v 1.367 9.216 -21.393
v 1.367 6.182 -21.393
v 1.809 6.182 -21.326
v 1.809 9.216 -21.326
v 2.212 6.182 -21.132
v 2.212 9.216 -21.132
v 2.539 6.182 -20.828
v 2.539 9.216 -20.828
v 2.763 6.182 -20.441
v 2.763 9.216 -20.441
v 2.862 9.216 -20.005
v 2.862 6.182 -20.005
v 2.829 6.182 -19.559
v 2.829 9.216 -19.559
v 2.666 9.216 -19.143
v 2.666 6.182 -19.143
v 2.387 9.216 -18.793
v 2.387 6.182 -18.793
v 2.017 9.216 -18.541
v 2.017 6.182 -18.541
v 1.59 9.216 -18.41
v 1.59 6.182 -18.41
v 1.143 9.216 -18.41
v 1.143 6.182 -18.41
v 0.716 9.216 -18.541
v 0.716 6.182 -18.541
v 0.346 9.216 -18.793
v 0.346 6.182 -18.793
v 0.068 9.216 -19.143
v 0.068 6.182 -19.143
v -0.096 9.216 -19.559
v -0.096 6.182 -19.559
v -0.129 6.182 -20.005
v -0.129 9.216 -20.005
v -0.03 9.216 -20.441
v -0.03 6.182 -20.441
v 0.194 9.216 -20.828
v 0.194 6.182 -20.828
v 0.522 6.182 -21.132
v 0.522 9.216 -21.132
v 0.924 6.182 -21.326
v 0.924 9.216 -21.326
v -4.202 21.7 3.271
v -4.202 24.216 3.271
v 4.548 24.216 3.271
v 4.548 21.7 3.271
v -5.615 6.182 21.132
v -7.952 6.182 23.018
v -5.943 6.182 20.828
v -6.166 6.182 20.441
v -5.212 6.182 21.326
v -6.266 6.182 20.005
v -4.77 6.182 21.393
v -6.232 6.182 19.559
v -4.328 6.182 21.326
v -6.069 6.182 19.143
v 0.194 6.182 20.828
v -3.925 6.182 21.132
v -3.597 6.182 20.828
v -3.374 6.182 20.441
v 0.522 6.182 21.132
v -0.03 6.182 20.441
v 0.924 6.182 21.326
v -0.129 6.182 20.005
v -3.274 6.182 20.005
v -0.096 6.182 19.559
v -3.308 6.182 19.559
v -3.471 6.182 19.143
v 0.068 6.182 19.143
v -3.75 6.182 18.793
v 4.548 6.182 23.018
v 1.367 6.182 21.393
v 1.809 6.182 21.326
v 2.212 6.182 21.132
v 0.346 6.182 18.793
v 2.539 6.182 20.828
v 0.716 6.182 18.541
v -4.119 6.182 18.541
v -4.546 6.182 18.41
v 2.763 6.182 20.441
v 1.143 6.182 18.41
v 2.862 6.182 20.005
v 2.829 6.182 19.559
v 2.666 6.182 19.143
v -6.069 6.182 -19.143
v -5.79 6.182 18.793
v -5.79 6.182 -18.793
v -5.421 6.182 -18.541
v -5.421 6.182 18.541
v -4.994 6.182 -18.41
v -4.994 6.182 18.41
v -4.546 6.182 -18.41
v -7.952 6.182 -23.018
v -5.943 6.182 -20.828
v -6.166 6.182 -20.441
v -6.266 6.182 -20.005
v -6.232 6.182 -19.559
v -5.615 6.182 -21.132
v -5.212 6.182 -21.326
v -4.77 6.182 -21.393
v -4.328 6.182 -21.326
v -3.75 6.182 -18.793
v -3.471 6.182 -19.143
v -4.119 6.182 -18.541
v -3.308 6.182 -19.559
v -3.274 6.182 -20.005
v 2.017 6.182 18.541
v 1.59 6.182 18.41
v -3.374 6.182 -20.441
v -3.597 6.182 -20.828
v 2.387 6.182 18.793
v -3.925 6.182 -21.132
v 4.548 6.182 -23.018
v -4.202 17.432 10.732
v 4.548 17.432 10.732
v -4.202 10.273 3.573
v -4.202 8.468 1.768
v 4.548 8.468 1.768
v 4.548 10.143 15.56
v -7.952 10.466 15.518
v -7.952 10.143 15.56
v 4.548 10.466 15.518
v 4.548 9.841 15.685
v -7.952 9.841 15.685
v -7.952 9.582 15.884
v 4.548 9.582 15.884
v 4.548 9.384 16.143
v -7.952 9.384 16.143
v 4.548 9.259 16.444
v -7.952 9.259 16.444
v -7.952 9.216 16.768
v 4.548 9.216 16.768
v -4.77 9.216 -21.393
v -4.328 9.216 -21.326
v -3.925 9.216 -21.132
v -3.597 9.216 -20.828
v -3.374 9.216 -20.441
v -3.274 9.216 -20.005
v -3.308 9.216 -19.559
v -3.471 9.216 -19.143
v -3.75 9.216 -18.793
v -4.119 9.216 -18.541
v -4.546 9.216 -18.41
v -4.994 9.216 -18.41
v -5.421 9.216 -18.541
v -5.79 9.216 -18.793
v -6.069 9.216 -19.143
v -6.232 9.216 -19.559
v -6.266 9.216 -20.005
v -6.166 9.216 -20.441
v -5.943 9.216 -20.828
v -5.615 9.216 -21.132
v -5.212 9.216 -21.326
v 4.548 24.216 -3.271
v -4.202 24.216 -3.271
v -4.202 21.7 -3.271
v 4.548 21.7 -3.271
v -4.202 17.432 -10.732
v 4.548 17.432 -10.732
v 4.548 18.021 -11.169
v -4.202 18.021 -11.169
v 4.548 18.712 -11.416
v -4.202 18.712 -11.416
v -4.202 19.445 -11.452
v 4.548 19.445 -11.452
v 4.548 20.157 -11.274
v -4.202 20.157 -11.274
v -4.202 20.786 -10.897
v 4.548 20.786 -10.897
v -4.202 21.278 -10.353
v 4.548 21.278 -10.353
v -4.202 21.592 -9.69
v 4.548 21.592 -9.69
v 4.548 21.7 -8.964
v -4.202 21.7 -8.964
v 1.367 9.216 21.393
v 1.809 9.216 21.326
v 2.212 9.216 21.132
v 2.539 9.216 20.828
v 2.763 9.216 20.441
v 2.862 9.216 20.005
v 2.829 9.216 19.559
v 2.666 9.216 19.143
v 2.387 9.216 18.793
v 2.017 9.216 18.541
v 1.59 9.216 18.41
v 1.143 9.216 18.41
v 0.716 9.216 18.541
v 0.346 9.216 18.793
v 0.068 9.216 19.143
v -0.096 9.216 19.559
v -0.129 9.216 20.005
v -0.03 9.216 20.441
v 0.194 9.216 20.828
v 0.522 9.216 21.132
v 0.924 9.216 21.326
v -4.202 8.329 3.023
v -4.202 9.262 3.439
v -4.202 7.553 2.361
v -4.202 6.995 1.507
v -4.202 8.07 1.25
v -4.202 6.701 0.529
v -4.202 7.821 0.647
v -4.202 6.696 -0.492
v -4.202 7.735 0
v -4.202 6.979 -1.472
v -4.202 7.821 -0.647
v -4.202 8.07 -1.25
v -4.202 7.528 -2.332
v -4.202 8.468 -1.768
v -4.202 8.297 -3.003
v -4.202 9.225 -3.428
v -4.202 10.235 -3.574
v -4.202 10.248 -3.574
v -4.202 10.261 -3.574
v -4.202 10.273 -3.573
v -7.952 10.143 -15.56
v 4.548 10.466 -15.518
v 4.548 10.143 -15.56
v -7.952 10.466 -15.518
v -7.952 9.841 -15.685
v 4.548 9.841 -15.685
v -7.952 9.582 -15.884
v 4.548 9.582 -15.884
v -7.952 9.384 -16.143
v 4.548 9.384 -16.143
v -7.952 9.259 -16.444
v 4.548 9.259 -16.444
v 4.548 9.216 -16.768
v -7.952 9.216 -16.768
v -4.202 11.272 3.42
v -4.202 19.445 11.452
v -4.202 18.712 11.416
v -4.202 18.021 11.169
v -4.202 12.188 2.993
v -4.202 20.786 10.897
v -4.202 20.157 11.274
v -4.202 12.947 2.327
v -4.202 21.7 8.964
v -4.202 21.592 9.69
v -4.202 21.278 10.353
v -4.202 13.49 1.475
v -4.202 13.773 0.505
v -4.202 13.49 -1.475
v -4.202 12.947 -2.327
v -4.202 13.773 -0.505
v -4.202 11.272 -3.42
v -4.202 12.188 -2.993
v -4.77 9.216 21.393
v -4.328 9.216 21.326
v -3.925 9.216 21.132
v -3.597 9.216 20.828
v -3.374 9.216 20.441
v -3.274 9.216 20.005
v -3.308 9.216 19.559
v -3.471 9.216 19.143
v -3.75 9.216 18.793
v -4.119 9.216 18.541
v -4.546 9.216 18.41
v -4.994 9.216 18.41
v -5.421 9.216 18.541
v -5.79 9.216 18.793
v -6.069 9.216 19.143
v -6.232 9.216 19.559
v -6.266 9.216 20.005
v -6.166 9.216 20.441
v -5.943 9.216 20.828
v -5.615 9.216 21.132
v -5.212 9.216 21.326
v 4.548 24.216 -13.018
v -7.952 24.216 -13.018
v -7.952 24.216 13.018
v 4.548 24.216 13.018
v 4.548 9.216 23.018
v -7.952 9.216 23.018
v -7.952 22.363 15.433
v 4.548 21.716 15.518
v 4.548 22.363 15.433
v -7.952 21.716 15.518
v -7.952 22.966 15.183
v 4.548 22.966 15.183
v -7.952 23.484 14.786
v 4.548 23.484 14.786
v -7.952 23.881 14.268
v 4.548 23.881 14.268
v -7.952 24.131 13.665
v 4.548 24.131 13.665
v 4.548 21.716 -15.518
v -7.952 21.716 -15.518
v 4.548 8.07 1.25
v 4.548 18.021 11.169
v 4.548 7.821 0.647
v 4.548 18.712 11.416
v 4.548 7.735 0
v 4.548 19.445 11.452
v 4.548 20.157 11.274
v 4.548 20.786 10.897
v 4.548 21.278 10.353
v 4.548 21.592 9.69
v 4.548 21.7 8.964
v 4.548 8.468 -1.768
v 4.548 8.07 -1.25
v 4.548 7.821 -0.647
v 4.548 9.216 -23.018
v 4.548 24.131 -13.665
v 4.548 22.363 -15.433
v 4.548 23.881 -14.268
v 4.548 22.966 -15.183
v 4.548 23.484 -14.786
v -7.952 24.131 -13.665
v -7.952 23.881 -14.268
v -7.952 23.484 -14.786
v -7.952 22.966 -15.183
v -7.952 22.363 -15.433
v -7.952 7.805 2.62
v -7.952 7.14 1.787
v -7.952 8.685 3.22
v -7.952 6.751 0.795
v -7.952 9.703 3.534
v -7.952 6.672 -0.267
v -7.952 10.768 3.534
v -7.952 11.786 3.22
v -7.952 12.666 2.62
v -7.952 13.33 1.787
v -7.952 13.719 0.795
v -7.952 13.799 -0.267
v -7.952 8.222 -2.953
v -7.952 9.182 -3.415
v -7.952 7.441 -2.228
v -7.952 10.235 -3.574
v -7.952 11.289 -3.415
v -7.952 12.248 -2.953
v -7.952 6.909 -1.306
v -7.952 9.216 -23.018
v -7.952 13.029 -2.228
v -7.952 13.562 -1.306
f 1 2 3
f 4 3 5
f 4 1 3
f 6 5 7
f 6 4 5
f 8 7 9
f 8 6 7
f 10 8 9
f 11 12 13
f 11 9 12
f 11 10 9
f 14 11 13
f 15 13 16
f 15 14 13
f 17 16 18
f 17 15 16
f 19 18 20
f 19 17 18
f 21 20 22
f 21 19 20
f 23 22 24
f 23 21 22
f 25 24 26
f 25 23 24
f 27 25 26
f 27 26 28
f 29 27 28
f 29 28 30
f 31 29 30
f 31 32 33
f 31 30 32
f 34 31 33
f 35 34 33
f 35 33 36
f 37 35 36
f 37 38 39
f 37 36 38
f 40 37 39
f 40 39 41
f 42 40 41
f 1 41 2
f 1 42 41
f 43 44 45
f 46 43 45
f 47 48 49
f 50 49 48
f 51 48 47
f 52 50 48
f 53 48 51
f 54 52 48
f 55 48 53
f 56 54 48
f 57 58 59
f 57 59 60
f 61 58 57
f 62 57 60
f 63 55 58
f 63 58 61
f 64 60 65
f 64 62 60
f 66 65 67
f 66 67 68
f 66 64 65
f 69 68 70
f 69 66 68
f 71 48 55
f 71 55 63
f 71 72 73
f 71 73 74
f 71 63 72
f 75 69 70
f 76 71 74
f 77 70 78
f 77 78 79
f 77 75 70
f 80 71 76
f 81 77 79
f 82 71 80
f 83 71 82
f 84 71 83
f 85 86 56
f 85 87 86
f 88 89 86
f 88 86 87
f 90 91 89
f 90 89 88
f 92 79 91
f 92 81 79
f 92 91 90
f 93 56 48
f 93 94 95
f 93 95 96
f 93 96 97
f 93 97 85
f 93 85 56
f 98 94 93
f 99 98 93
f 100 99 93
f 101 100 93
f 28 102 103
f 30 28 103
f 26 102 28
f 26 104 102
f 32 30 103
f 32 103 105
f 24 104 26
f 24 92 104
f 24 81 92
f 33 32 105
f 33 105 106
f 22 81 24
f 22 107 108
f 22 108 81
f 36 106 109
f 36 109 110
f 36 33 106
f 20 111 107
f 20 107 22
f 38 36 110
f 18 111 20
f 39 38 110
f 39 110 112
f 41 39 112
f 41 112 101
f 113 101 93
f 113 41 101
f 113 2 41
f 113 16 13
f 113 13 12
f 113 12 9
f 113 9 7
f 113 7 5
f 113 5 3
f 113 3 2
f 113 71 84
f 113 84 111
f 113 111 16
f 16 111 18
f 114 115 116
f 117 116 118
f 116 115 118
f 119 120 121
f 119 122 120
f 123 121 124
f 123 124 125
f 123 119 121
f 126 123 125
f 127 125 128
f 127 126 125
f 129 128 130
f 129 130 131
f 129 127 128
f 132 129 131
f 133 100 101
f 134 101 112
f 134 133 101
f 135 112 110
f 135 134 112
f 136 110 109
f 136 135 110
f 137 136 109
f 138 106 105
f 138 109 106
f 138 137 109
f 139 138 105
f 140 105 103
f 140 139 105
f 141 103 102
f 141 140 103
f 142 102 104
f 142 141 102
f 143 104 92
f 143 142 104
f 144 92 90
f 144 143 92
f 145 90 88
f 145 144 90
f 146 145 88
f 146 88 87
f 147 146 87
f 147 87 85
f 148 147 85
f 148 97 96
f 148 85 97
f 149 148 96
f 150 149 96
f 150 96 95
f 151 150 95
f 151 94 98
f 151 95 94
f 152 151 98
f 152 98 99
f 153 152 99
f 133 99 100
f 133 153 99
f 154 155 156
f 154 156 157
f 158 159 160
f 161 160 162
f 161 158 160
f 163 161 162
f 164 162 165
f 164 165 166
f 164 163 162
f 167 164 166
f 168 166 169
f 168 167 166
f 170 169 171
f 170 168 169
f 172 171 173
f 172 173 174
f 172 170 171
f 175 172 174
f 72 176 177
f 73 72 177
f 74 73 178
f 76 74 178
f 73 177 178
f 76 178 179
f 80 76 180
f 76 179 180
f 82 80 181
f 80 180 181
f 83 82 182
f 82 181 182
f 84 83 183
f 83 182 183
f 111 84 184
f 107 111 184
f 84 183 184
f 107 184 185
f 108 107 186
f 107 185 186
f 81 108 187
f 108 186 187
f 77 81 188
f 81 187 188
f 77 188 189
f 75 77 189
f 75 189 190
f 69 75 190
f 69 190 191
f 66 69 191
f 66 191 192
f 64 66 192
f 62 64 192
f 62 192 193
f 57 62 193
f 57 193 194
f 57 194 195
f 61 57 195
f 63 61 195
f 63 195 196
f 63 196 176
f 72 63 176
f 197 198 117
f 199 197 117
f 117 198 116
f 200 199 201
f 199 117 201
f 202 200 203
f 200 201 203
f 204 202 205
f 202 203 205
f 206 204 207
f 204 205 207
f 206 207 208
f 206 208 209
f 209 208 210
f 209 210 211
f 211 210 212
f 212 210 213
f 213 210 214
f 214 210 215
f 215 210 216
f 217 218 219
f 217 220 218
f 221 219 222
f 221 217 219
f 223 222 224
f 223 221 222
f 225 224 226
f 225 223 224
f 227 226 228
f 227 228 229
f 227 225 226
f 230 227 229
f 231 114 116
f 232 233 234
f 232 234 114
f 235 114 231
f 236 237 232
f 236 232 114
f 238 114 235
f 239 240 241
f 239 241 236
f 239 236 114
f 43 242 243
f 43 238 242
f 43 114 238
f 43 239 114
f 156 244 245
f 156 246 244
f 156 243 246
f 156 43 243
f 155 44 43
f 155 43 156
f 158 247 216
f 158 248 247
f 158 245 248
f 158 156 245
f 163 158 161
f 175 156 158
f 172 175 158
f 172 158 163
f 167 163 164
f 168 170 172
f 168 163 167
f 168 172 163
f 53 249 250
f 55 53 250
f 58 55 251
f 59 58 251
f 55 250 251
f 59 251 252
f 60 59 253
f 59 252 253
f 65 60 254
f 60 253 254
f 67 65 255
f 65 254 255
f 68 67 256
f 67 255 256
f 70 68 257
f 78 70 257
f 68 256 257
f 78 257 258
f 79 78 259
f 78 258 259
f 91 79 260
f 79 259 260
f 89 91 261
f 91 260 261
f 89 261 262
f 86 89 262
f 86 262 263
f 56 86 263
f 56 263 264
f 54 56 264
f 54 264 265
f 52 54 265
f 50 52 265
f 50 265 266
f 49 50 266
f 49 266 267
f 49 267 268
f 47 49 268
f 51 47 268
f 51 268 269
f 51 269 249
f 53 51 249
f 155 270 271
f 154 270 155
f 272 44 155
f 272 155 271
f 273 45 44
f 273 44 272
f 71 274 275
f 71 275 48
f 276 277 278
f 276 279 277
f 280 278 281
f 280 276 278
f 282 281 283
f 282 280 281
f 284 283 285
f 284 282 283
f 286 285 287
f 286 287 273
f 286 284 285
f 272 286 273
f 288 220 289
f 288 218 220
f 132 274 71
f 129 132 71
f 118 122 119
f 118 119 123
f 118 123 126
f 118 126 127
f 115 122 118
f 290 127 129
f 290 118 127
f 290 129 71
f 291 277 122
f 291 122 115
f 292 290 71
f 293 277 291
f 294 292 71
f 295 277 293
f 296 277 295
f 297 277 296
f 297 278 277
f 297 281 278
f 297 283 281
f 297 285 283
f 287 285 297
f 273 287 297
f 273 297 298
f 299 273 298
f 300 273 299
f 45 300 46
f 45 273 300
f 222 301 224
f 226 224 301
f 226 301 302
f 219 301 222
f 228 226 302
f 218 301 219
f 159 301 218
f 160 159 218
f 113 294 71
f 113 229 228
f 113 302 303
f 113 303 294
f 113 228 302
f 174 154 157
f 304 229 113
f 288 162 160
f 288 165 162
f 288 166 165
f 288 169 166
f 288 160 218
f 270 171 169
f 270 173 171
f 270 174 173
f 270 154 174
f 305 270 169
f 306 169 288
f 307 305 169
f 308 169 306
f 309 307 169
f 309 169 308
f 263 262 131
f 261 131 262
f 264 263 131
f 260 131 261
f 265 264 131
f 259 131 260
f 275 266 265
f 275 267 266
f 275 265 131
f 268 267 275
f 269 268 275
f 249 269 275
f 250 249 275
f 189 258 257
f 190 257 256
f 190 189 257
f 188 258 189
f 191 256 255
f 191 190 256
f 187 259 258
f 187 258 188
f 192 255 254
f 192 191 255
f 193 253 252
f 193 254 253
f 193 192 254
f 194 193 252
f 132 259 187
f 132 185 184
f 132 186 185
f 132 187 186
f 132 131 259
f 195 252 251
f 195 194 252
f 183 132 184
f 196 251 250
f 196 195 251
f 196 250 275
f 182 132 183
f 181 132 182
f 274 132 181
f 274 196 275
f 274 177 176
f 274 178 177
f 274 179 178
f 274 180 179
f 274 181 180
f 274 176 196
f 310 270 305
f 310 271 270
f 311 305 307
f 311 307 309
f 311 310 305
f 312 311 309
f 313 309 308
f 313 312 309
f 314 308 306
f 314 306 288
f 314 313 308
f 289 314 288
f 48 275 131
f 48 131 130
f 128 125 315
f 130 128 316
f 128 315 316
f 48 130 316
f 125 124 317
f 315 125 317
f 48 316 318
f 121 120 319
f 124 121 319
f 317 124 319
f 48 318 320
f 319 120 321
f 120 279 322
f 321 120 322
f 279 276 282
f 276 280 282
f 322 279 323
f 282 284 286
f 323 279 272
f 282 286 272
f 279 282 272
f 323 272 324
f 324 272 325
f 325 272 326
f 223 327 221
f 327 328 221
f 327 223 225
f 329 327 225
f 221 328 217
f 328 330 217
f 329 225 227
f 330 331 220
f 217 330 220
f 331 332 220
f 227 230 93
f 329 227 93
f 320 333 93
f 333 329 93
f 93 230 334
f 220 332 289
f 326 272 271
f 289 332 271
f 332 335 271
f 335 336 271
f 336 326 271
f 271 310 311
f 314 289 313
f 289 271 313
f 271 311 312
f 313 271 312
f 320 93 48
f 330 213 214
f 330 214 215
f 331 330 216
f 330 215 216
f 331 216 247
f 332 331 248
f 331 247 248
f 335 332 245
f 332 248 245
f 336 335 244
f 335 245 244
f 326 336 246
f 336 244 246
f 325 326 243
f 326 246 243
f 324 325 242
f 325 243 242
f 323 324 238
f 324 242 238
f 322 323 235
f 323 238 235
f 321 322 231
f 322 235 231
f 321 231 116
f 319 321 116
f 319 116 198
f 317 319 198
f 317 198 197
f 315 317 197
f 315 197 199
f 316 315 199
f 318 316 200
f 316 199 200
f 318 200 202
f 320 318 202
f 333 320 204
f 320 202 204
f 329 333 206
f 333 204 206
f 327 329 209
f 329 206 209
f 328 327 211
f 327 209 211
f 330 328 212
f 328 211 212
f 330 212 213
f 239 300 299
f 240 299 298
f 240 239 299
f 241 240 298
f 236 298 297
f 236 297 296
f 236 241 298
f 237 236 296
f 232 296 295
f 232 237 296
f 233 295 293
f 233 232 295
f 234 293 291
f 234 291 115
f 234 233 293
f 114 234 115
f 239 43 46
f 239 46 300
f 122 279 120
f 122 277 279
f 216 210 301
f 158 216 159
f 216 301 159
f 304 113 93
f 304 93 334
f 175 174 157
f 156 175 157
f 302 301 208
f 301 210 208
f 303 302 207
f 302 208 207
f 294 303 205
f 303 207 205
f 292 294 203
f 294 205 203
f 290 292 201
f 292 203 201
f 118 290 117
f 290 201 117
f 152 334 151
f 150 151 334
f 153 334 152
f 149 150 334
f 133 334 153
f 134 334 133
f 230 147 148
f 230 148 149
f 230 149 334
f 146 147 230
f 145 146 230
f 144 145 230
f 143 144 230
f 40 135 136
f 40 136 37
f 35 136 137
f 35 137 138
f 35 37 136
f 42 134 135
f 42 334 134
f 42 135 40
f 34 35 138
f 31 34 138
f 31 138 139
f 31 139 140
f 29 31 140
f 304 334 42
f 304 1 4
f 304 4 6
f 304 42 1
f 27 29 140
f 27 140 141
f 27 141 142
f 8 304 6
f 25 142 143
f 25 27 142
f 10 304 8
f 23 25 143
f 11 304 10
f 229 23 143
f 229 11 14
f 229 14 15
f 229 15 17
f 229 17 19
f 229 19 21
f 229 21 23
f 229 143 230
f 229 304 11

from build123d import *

# Parameters (mm, degrees)
BOSS_EXTRUDE2_DEPTH = 25
CUT_EXTRUDE2_DEPTH  = 35
FILLET3_R           = 10
SKETCH5_R           = 14.294796693
CUT_EXTRUDE3_DEPTH  = 15
FILLET4_R           = 10
FILLET5_R           = 5
SKETCH6_R           = 6
CUT_EXTRUDE4_DEPTH  = 35
SKETCH8_W           = 35
SKETCH8_H           = 26.166184444
CUT_EXTRUDE6_DEPTH  = 10.066320609
SCALE1_SCALE        = 0.25


with BuildPart() as part:
    # Sketch2 → Boss-Extrude2 (new, symmetric)
    with BuildSketch(Plane(origin=(0, 0, 0), x_dir=(0, 0, -1), z_dir=(1, 0, 0))):
        Polygon((-62.071067812, 55), (-62.071067812, -5), (-92.071067812, -5), (-92.071067812, -17.136235823), (92.071067812, -17.136235823), (92.071067812, -5), (62.071067812, -5), (62.071067812, 55), align=None)
    extrude(amount=BOSS_EXTRUDE2_DEPTH, both=True)

    # Sketch3 → Cut-Extrude2 (cut)
    with BuildSketch(Plane(origin=(25, 0, 0), x_dir=(0, 0, -1), z_dir=(1, 0, 0))):
        Polygon((0, -15.066320609), (60, 44.933679391), (-60, 44.933679391), align=None)
    extrude(amount=-CUT_EXTRUDE2_DEPTH, mode=Mode.SUBTRACT)

    # Fillet3
    fillet3_edges = [part.edges().sort_by_distance(p)[0] for p in [
        (7.5, -15.066320609, 0),
        (7.5, 44.933679391, 60),
        (7.5, 44.933679391, -60),
    ]]
    fillet(fillet3_edges, radius=FILLET3_R)

    # Sketch5 → Cut-Extrude3 (cut)
    with BuildSketch(Plane(origin=(-10, 0, 0), x_dir=(0, 0, -1), z_dir=(1, 0, 0))):
        with Locations((0, -0.924184985)):
            Circle(SKETCH5_R)
    extrude(amount=-CUT_EXTRUDE3_DEPTH, mode=Mode.SUBTRACT)

    # Fillet4
    fillet4_edges = [part.edges().sort_by_distance(p)[0] for p in [
        (0, 55, 62.071067812),
        (0, 55, -62.071067812),
    ]]
    fillet(fillet4_edges, radius=FILLET4_R)

    # Fillet5
    fillet5_edges = [part.edges().sort_by_distance(p)[0] for p in [
        (0, -5, -62.071067812),
        (0, -5, 62.071067812),
    ]]
    fillet(fillet5_edges, radius=FILLET5_R)

    # Sketch6 → Cut-Extrude4 (cut)
    with BuildSketch(Plane(origin=(0, -5, 0), x_dir=(1, 0, 0), z_dir=(0, 1, 0))):
        with Locations(Location((-12.273124469, -79.571067812, 0), (0, 0, 270))):
            Circle(SKETCH6_R)
        with Locations(Location((12.273124469, -79.571067812, 0), (0, 0, 270))):
            Circle(SKETCH6_R)
    cut_extrude4 = extrude(amount=-CUT_EXTRUDE4_DEPTH, mode=Mode.SUBTRACT)

    # Mirror1: Cut-Extrude4 across plane
    add(cut_extrude4.mirror(Plane.XY), mode=Mode.SUBTRACT)

    # Sketch8 → Cut-Extrude6 (cut)
    with BuildSketch(Plane(origin=(0, 55, 0), x_dir=(1, 0, 0), z_dir=(0, 1, 0))):
        with Locations((7.5, 0)):
            Rectangle(SKETCH8_W, SKETCH8_H)
    extrude(amount=-CUT_EXTRUDE6_DEPTH, mode=Mode.SUBTRACT)


with BuildPart() as part_1:
    # Scale1: scaled about (-2.268878972, 13.955162183, 0)
    add(part.part.scale(SCALE1_SCALE).moved(Location((-1.701659229, 10.466371637, 0))))


solid = part_1.part
